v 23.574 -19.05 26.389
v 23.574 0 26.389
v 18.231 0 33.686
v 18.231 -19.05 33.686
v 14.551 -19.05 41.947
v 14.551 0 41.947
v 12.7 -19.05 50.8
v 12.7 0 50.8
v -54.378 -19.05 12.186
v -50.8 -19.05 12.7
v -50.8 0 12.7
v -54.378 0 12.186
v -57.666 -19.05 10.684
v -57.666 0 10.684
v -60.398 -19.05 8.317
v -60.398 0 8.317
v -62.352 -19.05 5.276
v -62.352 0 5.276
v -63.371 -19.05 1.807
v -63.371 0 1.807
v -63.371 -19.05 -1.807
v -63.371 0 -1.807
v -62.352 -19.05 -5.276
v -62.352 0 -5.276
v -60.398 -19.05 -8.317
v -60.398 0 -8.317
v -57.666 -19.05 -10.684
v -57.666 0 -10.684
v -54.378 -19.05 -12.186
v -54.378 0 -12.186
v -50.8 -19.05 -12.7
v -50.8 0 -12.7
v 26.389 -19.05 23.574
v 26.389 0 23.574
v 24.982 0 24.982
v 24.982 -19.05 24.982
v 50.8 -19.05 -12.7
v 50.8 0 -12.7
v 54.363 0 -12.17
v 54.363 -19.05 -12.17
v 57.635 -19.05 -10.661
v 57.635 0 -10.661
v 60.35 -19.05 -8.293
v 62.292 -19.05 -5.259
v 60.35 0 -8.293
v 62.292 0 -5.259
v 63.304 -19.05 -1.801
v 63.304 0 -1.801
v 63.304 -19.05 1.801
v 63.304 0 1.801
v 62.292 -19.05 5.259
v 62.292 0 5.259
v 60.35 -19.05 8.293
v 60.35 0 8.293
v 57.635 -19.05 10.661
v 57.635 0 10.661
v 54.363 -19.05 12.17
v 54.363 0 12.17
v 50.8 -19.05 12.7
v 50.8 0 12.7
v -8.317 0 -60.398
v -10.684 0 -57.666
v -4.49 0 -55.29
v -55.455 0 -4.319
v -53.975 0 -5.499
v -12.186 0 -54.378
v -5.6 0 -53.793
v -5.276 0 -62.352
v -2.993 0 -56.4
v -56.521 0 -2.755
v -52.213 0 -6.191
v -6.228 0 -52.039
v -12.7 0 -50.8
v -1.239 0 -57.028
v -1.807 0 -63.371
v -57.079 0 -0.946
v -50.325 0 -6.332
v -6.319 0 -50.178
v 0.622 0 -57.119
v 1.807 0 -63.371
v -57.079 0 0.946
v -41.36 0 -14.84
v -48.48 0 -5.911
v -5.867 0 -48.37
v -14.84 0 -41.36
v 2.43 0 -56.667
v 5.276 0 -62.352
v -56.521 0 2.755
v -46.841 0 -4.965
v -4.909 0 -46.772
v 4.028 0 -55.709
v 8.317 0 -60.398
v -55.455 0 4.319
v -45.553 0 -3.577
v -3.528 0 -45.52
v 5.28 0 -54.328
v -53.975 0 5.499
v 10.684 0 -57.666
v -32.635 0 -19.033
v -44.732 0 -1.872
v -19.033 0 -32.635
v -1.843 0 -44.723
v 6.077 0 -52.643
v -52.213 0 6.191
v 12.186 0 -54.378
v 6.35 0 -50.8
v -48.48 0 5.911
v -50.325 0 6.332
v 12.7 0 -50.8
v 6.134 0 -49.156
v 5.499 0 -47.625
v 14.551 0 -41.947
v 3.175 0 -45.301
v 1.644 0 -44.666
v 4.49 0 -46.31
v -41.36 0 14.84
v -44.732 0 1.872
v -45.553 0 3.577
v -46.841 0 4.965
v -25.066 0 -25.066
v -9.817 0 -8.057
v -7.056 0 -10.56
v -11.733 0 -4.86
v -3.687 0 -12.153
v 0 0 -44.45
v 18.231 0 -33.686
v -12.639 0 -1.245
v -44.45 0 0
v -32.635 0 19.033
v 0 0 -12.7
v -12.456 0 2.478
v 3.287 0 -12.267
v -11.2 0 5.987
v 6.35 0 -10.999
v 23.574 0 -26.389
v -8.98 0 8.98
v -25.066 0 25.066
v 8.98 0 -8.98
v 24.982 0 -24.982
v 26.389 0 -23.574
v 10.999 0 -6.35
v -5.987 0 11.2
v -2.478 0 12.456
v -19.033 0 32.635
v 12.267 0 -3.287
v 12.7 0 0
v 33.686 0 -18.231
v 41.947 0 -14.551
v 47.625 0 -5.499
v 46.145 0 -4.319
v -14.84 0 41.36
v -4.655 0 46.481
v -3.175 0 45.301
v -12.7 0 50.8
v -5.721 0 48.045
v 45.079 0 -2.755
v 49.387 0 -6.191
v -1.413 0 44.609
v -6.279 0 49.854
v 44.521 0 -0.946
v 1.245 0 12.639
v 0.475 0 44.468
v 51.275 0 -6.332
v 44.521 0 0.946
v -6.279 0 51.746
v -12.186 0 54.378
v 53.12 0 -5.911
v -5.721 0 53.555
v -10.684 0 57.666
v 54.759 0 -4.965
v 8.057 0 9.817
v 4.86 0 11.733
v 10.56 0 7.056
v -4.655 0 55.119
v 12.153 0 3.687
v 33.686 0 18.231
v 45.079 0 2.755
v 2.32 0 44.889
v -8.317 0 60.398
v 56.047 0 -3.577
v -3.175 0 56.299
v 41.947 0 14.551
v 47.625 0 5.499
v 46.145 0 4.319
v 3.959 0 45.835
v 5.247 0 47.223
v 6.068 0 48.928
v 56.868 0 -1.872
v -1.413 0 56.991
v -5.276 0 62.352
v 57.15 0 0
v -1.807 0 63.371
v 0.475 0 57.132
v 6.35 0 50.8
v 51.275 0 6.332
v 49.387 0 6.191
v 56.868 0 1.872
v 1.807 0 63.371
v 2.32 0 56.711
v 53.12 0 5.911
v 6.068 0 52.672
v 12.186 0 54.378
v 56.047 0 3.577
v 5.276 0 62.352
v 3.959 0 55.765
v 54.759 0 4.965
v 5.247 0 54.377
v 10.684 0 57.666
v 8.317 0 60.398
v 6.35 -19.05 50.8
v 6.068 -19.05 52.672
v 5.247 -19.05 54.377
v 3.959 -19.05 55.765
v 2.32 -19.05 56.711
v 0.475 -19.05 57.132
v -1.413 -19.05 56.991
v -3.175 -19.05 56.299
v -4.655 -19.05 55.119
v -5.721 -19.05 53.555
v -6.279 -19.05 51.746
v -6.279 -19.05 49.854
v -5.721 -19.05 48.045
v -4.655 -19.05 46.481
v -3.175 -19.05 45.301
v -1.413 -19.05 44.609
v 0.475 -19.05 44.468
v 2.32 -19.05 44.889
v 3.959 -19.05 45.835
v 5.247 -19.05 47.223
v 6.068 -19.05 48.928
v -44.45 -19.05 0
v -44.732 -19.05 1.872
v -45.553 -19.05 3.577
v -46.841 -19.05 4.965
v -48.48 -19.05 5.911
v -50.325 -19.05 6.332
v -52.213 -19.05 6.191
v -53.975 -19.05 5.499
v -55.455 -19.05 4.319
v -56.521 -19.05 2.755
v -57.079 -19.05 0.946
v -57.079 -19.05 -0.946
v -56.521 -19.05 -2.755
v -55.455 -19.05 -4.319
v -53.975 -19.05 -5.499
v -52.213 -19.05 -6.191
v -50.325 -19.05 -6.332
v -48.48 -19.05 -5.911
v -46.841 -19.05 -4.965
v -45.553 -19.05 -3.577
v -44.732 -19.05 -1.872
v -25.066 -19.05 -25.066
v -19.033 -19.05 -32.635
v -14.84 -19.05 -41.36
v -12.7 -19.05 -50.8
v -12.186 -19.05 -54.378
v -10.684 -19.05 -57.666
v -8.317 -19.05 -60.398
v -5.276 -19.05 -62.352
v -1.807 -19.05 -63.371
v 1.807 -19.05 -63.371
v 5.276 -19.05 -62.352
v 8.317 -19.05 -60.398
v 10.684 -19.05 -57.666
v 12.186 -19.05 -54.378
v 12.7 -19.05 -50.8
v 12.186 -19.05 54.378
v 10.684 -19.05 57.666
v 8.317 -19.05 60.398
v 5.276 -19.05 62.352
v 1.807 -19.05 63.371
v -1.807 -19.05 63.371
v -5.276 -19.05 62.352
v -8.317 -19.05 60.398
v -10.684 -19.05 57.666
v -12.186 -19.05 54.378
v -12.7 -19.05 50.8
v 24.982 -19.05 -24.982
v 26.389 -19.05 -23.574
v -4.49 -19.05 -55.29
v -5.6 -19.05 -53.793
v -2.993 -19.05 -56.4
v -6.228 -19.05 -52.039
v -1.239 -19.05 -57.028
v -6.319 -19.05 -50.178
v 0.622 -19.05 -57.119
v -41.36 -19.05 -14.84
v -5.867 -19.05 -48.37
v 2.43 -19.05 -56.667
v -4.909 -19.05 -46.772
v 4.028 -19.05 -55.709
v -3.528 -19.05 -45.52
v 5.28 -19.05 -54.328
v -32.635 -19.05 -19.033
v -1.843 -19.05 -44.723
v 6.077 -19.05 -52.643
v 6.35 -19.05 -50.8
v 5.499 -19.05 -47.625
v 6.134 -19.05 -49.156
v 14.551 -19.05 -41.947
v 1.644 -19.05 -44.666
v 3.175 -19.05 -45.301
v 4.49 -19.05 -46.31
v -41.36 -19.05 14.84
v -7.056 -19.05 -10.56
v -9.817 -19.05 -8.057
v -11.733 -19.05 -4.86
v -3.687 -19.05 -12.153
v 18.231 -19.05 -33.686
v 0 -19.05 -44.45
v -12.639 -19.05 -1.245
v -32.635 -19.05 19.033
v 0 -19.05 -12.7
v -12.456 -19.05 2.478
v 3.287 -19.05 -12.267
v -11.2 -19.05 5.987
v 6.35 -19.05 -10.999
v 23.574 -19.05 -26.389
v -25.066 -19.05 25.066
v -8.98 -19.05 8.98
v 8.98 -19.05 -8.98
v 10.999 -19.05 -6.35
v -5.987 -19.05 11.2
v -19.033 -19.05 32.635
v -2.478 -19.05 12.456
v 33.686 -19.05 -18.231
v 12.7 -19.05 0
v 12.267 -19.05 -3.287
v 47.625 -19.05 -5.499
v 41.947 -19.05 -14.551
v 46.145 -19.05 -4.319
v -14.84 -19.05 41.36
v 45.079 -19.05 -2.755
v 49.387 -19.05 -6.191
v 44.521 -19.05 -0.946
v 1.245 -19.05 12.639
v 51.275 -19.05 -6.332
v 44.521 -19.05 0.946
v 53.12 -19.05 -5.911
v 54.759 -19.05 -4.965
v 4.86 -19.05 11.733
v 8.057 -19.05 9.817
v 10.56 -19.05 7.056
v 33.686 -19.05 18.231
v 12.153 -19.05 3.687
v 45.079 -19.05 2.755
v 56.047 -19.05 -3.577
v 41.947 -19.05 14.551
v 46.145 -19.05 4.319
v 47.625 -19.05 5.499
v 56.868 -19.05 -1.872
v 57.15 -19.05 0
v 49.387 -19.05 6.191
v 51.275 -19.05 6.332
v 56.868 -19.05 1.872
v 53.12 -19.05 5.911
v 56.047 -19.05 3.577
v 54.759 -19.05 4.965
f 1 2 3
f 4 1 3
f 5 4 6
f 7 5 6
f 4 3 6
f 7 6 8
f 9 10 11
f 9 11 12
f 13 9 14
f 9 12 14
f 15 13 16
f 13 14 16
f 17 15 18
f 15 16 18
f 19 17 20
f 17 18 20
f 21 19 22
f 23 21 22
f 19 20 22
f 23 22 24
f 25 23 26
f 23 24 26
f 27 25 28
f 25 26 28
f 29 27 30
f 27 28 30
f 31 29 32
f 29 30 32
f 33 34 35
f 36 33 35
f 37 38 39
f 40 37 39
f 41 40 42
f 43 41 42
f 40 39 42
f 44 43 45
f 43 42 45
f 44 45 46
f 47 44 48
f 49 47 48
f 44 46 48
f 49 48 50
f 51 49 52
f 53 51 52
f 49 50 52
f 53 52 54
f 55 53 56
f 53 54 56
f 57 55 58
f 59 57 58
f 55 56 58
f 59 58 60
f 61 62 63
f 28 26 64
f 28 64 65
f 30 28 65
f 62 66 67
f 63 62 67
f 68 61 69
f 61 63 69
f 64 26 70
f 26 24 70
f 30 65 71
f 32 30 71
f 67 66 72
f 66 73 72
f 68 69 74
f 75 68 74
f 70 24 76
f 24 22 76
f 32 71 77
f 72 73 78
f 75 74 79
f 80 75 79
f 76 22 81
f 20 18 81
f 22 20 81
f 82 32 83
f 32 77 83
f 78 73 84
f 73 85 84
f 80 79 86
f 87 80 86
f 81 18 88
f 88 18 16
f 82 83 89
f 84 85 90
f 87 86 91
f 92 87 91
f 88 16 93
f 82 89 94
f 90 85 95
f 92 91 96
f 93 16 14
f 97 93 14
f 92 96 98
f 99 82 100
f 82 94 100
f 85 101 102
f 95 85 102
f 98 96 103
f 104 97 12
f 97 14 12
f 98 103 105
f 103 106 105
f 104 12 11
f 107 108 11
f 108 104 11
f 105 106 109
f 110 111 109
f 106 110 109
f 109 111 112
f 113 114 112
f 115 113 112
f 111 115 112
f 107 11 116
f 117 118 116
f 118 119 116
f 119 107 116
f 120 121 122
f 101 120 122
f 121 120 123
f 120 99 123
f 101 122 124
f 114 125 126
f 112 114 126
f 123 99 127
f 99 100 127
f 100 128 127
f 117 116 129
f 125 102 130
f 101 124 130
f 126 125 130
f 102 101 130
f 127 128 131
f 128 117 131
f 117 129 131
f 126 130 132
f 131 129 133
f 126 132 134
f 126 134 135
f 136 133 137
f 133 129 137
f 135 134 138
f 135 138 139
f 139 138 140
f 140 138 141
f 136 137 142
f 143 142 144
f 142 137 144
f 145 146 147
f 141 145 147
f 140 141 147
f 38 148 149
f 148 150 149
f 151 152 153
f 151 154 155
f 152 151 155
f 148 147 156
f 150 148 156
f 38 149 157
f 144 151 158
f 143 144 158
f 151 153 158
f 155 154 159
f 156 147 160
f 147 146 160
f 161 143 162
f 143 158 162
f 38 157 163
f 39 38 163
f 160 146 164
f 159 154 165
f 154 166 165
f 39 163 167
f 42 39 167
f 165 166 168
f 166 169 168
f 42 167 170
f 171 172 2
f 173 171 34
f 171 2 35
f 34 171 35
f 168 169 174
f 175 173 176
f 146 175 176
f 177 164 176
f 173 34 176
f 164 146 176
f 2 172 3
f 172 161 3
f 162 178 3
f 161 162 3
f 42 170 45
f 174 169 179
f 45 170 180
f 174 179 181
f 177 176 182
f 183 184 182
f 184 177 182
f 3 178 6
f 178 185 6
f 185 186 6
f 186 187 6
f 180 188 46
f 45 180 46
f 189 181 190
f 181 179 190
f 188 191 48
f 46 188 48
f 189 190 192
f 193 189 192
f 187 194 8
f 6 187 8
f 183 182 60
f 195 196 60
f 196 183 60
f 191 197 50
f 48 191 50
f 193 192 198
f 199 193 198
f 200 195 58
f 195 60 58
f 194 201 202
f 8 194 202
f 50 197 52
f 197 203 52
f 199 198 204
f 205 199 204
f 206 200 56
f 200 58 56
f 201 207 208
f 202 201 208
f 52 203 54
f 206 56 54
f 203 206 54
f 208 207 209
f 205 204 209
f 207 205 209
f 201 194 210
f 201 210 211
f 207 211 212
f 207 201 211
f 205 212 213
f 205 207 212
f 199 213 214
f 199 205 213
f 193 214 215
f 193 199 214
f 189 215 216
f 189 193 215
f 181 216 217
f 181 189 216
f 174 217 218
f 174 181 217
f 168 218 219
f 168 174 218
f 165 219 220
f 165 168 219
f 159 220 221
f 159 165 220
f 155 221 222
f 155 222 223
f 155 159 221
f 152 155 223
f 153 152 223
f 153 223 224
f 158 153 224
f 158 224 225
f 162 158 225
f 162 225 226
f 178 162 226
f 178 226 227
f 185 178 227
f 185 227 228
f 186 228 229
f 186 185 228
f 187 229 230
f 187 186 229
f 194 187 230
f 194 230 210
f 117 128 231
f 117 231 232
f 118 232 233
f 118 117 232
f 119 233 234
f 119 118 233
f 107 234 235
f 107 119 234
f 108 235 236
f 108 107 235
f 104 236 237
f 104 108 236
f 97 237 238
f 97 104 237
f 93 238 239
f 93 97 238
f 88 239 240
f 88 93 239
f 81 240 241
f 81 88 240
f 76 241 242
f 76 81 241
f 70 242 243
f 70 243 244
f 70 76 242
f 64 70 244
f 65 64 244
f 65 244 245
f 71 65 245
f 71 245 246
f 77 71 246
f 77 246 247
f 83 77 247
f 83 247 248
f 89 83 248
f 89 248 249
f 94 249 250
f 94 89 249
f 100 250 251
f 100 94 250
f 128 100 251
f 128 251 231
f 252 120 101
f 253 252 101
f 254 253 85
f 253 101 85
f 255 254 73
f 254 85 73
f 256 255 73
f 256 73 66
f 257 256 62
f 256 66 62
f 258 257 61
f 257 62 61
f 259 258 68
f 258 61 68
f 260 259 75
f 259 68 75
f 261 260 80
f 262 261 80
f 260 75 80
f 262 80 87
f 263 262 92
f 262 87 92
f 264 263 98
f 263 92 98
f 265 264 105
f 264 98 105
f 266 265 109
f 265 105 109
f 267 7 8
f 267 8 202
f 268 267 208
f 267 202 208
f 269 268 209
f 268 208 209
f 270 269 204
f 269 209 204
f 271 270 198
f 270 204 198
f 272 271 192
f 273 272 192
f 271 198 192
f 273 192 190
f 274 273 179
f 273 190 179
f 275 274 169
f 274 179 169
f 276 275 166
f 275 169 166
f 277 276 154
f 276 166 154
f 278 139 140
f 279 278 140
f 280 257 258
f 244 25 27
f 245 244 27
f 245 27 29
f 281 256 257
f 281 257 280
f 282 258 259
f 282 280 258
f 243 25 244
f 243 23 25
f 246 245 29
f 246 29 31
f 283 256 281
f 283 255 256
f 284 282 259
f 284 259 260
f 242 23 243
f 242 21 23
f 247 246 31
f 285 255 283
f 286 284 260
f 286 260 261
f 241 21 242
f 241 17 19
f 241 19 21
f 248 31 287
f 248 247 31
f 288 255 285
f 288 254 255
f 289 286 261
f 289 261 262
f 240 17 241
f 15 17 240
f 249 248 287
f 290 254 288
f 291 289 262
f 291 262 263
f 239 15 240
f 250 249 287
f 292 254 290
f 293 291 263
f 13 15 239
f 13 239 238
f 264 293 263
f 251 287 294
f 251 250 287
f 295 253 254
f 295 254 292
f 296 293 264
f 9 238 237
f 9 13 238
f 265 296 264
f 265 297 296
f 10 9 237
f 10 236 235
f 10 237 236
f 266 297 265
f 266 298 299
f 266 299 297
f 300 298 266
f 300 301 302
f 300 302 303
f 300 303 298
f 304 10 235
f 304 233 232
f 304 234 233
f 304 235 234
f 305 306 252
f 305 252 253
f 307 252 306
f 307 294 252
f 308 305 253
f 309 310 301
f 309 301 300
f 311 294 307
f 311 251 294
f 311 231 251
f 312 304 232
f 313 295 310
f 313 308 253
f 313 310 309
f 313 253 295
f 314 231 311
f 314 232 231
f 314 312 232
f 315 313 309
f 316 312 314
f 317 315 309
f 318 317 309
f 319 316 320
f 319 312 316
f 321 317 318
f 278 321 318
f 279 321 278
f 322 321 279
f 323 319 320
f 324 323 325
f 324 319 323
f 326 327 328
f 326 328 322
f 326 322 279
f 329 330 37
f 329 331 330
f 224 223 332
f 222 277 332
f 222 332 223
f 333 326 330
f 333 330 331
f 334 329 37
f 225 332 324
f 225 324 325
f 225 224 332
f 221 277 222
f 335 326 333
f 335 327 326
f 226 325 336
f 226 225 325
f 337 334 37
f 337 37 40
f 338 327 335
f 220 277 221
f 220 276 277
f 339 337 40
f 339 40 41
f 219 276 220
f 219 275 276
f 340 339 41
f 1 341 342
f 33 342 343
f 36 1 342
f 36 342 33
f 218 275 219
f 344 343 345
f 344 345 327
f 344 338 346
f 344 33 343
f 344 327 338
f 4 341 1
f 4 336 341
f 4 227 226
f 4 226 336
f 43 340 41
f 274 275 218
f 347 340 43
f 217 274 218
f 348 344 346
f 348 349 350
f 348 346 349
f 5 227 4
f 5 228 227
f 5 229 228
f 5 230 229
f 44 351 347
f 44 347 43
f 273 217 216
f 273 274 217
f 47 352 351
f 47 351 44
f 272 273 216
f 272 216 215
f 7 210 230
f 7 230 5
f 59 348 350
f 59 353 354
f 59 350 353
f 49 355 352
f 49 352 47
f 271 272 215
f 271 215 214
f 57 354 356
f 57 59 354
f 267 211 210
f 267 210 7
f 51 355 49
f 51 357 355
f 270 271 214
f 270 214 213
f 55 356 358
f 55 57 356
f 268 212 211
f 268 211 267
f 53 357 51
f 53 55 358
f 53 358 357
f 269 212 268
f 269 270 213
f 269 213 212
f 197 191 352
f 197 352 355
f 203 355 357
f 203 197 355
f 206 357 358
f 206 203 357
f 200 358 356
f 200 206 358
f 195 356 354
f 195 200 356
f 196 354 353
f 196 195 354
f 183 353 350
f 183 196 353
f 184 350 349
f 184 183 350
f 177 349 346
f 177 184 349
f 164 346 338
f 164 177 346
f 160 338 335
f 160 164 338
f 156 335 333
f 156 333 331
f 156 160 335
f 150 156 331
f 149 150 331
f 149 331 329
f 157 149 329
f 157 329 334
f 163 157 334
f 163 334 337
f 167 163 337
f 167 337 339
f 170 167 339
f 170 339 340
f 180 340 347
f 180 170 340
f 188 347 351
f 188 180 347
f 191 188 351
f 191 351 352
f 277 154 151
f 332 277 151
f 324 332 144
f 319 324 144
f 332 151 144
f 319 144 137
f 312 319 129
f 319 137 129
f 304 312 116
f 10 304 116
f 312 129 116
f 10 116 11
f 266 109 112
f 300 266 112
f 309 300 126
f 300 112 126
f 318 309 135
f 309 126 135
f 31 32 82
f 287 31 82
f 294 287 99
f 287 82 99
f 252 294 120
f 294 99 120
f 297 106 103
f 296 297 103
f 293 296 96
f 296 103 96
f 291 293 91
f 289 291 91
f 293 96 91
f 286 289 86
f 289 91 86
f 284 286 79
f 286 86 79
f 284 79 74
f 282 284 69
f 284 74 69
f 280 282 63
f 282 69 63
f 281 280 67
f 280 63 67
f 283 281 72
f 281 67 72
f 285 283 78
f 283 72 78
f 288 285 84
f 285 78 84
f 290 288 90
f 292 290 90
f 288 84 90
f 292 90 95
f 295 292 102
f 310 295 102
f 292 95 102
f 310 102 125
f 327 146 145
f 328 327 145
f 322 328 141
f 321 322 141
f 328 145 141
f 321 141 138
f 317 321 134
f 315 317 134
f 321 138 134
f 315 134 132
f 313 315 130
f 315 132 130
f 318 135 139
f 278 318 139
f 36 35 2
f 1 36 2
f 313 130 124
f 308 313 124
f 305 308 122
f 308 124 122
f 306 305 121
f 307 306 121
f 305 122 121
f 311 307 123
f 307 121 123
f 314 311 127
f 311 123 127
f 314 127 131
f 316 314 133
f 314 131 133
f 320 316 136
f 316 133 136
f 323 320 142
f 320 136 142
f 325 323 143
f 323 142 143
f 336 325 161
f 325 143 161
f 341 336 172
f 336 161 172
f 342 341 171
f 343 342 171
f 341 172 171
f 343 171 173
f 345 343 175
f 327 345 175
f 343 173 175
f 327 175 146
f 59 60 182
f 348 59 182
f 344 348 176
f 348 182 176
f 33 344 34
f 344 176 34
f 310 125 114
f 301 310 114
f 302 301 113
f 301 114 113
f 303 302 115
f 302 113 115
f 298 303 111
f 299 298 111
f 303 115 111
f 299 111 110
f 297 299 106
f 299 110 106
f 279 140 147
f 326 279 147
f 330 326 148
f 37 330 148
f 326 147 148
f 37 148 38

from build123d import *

# Parameters (mm, degrees)
F0_R     = 6.35
F1_DEPTH = 19.05


with BuildPart() as f1:
    # F0 (on Front) → F1 (new body)
    with BuildSketch(Plane.XZ):
        with BuildLine():
            ThreePointArc((6.35, -50.8), (4.490128, -46.309872), (0, -44.45))
            ThreePointArc((0, -44.45), (-4.490128, -55.290128), (6.35, -50.8))
        make_face()
        with Locations((50.8, 0)):
            Circle(F0_R)
        with BuildLine():
            Line((26.389365, 23.574162), (24.981764, 24.981764))
            Line((24.981764, 24.981764), (24.948811, 24.948811))
            ThreePointArc((24.948811, 24.948811), (25.661044, 24.253057), (26.389365, 23.574162))
        make_face()
        with BuildLine():
            Line((24.948811, 24.948811), (24.981764, 24.981764))
            Line((24.981764, 24.981764), (23.574162, 26.389365))
            ThreePointArc((23.574162, 26.389365), (24.253057, 25.661044), (24.948811, 24.948811))
        make_face()
        with BuildLine():
            ThreePointArc((26.389365, 23.574162), (25.661044, 24.253057), (24.948811, 24.948811))
            ThreePointArc((24.948811, 24.948811), (24.253057, 25.661044), (23.574162, 26.389365))
            ThreePointArc((23.574162, 26.389365), (16.170482, 37.718625), (12.7, 50.8))
            ThreePointArc((12.7, 50.8), (0, 63.5), (-12.7, 50.8))
            ThreePointArc((-12.7, 50.8), (-25.065625, 25.065625), (-50.8, 12.7))
            ThreePointArc((-50.8, 12.7), (-63.5, 0), (-50.8, -12.7))
            ThreePointArc((-50.8, -12.7), (-36.87956, -16.690866), (-25.065625, -25.065625))
            ThreePointArc((-25.065625, -25.065625), (-16.690866, -36.87956), (-12.7, -50.8))
            ThreePointArc((-12.7, -50.8), (0, -63.5), (12.7, -50.8))
            ThreePointArc((12.7, -50.8), (16.170482, -37.718625), (23.574162, -26.389365))
            ThreePointArc((23.574162, -26.389365), (24.253057, -25.661044), (24.948811, -24.948811))
            ThreePointArc((24.948811, -24.948811), (25.661044, -24.253057), (26.389365, -23.574162))
            ThreePointArc((26.389365, -23.574162), (37.718625, -16.170482), (50.8, -12.7))
            ThreePointArc((50.8, -12.7), (63.432032, 0), (50.8, 12.7))
            ThreePointArc((50.8, 12.7), (37.718625, 16.170482), (26.389365, 23.574162))
        make_face()
        with BuildLine():
            ThreePointArc((6.35, -50.8), (-4.490128, -55.290128), (0, -44.45))
            ThreePointArc((0, -44.45), (4.490128, -46.309872), (6.35, -50.8))
        make_face(mode=Mode.SUBTRACT)
        with Locations((-50.8, 0)):
            Circle(F0_R, mode=Mode.SUBTRACT)
        with BuildLine():
            ThreePointArc((12.7, 0), (8.980256, -8.980256), (0, -12.7))
            ThreePointArc((0, -12.7), (-8.980256, 8.980256), (12.7, 0))
        make_face(mode=Mode.SUBTRACT)
        with Locations((50.8, 0)):
            Circle(F0_R, mode=Mode.SUBTRACT)
        with Locations((0, 50.8)):
            Circle(F0_R, mode=Mode.SUBTRACT)
        with BuildLine():
            Line((24.981764, -24.981764), (26.389365, -23.574162))
            ThreePointArc((26.389365, -23.574162), (25.661044, -24.253057), (24.948811, -24.948811))
            Line((24.948811, -24.948811), (24.981764, -24.981764))
        make_face()
        with BuildLine():
            Line((23.574162, -26.389365), (24.981764, -24.981764))
            Line((24.981764, -24.981764), (24.948811, -24.948811))
            ThreePointArc((24.948811, -24.948811), (24.253057, -25.661044), (23.574162, -26.389365))
        make_face()
    extrude(amount=F1_DEPTH)


solid = f1.part
